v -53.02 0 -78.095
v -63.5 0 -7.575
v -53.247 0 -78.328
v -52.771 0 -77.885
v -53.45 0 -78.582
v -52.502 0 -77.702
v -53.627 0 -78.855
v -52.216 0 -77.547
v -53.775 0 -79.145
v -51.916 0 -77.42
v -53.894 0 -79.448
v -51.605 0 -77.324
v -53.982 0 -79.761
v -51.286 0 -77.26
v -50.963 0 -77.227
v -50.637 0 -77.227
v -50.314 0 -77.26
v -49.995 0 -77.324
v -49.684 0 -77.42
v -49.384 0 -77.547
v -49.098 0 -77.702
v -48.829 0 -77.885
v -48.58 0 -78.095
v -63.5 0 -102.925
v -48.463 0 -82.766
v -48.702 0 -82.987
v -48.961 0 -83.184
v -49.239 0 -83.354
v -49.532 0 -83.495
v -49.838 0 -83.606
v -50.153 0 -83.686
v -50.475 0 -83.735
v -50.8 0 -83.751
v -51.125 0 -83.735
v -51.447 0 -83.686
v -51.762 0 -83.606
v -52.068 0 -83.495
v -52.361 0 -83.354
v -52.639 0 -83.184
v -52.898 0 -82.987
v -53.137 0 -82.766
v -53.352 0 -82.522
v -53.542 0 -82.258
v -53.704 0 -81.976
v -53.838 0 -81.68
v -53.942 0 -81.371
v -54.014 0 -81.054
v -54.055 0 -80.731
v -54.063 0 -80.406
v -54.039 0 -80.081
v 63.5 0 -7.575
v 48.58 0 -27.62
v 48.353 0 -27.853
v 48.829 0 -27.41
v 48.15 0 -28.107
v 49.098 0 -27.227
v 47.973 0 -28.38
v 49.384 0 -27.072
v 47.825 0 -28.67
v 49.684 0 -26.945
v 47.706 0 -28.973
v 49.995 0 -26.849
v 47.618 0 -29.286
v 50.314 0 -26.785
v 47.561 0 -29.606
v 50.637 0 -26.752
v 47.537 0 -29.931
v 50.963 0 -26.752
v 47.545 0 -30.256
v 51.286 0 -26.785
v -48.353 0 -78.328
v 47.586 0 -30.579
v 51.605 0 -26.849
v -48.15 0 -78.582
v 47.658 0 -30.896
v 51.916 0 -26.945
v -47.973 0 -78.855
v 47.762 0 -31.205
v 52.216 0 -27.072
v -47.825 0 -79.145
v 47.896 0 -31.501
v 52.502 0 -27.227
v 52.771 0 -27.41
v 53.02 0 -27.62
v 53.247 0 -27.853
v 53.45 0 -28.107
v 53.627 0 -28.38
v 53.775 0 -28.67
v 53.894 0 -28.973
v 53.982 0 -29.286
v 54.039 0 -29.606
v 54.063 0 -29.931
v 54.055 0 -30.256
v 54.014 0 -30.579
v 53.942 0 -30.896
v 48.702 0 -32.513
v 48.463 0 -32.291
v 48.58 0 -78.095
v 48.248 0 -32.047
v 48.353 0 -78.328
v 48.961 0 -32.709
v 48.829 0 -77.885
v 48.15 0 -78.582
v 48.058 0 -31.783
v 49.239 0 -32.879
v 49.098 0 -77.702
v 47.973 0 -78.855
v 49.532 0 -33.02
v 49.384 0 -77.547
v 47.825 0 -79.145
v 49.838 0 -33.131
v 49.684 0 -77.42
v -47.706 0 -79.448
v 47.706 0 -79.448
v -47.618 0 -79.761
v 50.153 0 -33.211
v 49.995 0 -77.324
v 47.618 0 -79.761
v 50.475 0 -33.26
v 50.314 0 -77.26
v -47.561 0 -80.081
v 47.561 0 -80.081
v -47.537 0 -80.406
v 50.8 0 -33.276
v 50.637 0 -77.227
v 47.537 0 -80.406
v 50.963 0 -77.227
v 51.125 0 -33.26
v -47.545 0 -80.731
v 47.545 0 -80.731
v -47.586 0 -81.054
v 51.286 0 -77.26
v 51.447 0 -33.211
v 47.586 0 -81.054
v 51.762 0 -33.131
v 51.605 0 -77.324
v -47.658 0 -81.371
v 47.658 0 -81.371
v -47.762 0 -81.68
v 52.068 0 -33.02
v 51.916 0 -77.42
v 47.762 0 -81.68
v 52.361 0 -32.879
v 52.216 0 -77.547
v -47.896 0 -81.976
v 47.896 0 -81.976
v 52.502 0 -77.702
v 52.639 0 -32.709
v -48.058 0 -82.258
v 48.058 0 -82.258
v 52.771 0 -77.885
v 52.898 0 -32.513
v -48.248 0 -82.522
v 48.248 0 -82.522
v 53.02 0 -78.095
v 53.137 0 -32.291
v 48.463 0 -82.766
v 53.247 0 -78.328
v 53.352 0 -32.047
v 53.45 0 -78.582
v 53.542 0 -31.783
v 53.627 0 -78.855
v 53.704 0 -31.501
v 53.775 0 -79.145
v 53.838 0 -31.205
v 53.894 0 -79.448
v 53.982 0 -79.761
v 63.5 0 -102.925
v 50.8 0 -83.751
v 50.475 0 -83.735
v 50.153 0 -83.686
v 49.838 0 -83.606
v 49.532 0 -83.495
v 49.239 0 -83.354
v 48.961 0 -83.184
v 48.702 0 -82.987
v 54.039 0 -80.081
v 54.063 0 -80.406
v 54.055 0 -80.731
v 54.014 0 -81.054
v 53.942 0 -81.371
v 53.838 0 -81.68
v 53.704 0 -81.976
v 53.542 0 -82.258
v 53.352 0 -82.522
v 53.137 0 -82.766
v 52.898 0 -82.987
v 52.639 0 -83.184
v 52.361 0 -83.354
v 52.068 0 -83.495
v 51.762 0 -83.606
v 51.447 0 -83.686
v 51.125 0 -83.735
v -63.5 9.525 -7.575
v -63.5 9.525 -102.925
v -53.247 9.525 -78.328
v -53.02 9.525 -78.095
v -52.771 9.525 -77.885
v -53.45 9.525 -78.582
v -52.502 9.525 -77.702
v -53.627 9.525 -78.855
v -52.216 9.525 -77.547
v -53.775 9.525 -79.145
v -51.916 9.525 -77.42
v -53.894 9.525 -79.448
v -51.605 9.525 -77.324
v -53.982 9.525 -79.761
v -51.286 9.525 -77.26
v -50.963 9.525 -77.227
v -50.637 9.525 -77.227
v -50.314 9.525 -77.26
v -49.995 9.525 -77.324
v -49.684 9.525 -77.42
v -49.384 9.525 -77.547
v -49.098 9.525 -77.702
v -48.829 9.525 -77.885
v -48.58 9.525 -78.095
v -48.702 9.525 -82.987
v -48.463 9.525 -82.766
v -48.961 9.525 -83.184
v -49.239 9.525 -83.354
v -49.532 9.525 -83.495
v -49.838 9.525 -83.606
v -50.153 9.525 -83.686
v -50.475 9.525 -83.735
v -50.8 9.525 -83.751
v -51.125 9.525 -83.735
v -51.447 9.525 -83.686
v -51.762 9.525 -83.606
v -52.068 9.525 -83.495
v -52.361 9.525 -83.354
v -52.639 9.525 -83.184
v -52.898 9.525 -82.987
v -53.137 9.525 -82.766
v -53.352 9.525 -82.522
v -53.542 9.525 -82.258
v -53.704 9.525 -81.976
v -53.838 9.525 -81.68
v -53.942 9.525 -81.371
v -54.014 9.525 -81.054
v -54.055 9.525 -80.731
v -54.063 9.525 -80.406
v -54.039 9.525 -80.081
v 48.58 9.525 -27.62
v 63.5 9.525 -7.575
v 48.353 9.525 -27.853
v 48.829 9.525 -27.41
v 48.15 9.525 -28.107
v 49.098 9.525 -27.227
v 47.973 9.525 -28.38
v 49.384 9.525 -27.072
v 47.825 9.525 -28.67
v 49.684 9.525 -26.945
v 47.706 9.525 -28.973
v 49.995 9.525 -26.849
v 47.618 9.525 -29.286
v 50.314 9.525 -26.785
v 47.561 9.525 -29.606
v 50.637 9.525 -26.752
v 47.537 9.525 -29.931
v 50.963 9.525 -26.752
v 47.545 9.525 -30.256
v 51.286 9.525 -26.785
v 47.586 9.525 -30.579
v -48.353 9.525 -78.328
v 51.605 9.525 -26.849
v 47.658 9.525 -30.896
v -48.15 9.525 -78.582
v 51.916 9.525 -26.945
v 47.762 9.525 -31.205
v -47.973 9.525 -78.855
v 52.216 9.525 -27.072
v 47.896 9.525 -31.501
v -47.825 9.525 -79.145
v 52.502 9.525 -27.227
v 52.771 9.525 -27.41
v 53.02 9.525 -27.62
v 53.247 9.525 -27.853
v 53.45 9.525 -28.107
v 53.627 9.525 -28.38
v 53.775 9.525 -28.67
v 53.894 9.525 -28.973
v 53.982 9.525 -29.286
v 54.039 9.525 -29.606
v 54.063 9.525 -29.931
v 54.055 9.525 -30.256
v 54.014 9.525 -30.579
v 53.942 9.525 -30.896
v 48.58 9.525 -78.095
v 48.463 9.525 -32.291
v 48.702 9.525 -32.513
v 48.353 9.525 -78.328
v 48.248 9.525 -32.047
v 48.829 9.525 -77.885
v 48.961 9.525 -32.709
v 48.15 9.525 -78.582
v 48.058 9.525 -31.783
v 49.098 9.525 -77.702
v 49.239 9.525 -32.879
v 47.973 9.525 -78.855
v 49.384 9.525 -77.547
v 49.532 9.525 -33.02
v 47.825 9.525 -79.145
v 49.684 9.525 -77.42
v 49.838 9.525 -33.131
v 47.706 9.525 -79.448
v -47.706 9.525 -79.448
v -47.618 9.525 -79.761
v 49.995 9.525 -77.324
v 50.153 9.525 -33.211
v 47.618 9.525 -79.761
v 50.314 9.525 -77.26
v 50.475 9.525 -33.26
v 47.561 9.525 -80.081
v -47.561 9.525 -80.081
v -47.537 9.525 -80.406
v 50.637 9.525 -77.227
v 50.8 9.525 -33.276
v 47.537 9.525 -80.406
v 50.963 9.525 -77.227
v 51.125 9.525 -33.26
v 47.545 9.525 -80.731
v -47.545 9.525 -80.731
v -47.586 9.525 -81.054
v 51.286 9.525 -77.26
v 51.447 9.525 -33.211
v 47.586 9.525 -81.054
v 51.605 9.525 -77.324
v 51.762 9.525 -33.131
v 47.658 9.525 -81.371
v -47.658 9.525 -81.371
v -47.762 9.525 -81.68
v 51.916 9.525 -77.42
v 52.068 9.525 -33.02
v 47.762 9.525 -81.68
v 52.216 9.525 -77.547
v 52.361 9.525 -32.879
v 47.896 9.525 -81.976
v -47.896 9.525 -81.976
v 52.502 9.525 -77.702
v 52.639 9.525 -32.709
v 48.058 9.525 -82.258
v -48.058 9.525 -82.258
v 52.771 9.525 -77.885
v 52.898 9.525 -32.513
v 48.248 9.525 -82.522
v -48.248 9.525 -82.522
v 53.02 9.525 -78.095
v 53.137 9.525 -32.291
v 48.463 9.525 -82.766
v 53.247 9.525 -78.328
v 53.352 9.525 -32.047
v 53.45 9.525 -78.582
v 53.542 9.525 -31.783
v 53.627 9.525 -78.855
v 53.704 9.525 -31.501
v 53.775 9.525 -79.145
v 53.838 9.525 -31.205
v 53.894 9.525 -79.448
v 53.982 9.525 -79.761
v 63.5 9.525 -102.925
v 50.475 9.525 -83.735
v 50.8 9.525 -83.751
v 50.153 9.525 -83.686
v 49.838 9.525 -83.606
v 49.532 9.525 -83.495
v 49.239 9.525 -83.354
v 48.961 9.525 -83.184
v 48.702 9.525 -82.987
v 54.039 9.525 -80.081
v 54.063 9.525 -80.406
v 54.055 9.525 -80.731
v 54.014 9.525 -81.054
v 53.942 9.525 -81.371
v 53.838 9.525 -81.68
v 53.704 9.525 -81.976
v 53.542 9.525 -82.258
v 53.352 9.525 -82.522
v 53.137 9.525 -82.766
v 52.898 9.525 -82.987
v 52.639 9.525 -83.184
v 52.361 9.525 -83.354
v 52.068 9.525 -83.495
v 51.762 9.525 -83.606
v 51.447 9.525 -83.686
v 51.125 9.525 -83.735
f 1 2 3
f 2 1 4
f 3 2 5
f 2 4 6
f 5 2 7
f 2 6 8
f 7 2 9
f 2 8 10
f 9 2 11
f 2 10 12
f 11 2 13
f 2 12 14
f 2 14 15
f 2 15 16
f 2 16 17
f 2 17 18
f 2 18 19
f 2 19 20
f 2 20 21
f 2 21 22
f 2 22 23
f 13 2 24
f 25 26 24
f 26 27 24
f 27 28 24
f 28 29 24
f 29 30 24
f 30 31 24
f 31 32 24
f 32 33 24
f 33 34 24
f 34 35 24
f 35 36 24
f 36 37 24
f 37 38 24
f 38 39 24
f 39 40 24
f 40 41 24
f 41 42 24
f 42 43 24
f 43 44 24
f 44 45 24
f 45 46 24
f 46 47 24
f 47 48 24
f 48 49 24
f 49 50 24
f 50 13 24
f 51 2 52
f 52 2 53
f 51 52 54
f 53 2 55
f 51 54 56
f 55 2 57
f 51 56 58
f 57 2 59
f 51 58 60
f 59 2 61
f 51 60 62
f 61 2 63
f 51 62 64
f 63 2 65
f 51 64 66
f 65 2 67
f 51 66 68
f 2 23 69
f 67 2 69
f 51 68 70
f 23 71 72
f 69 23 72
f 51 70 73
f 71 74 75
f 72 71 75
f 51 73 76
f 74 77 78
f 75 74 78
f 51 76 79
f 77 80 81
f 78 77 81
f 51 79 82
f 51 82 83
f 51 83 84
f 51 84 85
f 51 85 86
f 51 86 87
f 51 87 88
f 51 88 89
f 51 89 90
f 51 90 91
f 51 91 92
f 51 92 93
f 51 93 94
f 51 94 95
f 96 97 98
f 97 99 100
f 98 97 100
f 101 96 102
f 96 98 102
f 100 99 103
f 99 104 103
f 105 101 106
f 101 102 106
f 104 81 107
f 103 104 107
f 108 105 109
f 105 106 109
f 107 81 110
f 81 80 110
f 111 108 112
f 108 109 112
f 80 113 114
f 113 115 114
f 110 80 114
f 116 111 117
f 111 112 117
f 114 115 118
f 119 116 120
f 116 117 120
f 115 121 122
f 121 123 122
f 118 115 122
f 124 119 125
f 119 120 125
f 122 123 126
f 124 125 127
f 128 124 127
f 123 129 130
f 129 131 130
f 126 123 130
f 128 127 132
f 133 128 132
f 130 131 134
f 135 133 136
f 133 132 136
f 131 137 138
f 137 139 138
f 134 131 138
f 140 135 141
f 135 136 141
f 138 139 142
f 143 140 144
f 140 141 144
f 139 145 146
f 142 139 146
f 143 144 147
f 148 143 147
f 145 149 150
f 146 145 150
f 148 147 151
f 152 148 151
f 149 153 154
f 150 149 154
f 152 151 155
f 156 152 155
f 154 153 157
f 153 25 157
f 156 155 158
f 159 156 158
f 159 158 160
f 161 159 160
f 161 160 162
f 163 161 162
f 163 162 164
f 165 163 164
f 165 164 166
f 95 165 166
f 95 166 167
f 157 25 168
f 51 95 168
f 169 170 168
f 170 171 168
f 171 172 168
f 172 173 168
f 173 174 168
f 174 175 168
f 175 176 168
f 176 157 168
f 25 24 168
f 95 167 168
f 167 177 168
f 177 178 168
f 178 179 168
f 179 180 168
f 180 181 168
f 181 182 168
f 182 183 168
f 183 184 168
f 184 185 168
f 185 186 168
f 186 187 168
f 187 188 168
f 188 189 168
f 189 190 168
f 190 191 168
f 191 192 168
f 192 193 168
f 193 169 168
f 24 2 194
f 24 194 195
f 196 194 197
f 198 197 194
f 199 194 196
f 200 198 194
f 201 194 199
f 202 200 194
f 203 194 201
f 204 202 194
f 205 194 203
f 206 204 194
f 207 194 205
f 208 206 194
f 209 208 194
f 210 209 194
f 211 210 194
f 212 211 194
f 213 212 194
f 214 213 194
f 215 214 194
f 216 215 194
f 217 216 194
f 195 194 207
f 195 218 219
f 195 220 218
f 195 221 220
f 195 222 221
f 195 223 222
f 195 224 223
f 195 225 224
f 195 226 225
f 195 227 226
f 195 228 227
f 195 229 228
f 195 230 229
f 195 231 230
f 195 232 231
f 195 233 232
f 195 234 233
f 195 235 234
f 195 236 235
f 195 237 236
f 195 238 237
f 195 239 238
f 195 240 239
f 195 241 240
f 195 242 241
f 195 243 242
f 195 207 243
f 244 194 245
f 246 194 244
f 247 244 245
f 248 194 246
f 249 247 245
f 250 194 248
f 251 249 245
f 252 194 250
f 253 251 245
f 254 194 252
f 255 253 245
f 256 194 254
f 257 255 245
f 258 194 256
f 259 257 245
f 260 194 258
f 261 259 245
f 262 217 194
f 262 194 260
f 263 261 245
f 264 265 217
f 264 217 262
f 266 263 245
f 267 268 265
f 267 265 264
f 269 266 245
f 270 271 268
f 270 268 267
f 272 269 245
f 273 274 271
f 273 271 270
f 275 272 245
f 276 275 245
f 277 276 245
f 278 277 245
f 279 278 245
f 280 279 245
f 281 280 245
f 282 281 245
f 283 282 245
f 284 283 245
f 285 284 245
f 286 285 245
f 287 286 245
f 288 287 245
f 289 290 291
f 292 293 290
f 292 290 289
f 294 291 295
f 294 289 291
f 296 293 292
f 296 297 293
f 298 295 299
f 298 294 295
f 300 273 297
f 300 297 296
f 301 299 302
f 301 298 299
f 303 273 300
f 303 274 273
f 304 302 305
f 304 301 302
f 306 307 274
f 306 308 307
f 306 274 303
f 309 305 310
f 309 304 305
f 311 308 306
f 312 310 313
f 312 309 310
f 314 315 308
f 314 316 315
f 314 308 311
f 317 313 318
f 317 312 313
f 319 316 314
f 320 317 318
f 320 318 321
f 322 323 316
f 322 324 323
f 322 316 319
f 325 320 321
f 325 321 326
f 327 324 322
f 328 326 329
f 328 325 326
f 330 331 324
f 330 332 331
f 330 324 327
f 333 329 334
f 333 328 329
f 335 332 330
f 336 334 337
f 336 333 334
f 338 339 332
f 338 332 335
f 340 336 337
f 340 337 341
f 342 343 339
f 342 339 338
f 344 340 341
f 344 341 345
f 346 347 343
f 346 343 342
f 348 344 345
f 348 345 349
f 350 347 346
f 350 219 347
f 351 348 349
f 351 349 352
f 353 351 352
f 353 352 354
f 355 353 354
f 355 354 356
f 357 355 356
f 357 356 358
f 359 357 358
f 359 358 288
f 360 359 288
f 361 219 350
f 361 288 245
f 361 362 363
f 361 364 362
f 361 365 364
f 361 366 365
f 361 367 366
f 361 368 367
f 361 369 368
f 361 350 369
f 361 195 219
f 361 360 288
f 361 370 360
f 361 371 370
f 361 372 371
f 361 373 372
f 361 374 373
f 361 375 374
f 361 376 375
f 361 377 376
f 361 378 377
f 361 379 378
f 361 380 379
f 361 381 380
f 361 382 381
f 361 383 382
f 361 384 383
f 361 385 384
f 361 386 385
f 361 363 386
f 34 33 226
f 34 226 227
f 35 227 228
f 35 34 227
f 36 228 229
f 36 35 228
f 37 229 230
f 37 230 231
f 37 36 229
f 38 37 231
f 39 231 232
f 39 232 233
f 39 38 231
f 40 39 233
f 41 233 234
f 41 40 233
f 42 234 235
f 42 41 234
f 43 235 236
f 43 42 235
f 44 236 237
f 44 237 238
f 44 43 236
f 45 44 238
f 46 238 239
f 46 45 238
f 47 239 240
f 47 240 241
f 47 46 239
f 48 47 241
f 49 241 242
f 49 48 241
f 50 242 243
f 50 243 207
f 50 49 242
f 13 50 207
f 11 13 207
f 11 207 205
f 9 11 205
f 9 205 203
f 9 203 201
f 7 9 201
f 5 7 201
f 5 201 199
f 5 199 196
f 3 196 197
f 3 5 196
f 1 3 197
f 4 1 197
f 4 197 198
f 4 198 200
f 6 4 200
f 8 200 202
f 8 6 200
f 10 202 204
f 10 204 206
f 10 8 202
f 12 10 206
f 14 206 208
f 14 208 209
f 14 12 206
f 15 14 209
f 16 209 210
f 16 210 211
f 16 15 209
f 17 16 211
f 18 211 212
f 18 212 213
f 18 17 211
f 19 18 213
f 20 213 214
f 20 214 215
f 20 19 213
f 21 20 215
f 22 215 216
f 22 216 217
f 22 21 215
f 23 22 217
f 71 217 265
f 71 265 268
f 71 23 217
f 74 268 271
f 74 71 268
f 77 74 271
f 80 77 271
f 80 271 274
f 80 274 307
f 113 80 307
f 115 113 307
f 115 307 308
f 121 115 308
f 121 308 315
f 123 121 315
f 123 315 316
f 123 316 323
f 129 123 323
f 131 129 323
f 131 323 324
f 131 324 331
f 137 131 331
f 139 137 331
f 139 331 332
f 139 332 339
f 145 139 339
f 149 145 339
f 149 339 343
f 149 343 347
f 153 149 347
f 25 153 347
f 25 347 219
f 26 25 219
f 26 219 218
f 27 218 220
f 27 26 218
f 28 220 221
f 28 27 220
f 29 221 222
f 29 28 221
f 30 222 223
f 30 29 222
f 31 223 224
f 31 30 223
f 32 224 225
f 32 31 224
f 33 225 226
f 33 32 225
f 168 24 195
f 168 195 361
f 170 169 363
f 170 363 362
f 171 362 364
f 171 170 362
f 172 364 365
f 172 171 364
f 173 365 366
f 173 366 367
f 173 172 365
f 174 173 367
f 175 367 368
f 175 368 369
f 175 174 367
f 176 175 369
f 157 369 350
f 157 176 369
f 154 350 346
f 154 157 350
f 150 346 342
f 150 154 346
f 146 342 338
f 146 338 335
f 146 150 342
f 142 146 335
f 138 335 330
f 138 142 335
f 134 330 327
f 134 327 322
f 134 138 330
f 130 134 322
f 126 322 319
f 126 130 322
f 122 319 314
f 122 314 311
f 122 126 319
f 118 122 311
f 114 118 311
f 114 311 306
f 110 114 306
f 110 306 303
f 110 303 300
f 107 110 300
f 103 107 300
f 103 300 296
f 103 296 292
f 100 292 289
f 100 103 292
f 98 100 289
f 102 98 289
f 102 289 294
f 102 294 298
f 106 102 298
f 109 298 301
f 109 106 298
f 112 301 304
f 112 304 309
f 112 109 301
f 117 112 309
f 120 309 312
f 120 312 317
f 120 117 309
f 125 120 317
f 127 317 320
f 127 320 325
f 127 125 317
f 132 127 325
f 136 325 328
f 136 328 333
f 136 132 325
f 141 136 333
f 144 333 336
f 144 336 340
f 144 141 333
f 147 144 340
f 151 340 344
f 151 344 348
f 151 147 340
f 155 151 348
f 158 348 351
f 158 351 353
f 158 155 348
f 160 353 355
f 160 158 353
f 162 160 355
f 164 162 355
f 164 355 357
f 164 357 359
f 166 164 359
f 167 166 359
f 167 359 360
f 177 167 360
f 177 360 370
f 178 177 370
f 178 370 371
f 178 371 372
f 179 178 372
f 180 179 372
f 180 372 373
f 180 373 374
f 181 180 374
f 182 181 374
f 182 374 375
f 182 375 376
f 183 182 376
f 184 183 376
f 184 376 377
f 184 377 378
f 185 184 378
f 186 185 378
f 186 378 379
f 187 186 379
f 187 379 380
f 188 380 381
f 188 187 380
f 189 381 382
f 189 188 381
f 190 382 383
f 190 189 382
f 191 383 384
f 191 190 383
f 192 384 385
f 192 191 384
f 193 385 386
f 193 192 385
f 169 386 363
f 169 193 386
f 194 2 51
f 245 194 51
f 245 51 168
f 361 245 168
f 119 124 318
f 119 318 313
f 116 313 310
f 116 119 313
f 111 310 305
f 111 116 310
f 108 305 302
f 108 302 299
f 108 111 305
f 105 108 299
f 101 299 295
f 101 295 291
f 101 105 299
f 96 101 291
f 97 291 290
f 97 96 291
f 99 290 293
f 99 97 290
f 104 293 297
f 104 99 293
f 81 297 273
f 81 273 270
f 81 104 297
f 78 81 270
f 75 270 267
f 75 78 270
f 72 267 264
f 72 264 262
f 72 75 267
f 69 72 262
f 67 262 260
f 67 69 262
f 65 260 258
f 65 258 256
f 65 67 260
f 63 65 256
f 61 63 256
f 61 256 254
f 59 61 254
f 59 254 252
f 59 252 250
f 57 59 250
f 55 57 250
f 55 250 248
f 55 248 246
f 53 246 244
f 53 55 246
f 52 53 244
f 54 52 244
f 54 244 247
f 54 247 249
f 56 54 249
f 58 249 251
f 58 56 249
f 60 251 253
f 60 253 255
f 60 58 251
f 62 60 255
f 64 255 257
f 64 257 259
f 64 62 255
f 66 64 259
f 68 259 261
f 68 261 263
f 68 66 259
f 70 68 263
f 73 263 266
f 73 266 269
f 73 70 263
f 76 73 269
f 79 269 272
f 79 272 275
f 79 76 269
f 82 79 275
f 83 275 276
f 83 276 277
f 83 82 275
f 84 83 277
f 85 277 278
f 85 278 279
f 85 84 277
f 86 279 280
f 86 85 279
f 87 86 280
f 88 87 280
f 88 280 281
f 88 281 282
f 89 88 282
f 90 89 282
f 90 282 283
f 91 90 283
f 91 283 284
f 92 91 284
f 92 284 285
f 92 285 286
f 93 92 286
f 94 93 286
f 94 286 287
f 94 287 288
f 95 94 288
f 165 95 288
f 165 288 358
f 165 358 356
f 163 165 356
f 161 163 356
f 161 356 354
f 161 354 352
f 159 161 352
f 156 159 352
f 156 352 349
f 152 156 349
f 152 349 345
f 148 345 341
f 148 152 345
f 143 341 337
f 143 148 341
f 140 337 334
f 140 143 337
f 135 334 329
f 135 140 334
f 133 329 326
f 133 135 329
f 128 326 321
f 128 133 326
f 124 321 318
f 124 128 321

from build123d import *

# Parameters (mm, degrees)
SKETCH1_W           = 127
SKETCH1_H           = 95.34985535
SKETCH1_R           = 3.2639
BOSS_EXTRUDE1_DEPTH = 9.525


with BuildPart() as part:
    # Sketch1 → Boss-Extrude1 (new body)
    with BuildSketch(Plane(origin=(0, 0, 0), x_dir=(1, 0, 0), z_dir=(0, 1, 0))):
        with Locations((1.506e-06, 55.24971147)):
            Rectangle(SKETCH1_W, SKETCH1_H)
        with Locations((-50.8000007, 80.487207029)):
            Circle(SKETCH1_R, mode=Mode.SUBTRACT)
        with Locations((50.800003712, 80.487207029)):
            Circle(SKETCH1_R, mode=Mode.SUBTRACT)
        with Locations((50.800003712, 30.012215911)):
            Circle(SKETCH1_R, mode=Mode.SUBTRACT)
    extrude(amount=BOSS_EXTRUDE1_DEPTH)


solid = part.part
